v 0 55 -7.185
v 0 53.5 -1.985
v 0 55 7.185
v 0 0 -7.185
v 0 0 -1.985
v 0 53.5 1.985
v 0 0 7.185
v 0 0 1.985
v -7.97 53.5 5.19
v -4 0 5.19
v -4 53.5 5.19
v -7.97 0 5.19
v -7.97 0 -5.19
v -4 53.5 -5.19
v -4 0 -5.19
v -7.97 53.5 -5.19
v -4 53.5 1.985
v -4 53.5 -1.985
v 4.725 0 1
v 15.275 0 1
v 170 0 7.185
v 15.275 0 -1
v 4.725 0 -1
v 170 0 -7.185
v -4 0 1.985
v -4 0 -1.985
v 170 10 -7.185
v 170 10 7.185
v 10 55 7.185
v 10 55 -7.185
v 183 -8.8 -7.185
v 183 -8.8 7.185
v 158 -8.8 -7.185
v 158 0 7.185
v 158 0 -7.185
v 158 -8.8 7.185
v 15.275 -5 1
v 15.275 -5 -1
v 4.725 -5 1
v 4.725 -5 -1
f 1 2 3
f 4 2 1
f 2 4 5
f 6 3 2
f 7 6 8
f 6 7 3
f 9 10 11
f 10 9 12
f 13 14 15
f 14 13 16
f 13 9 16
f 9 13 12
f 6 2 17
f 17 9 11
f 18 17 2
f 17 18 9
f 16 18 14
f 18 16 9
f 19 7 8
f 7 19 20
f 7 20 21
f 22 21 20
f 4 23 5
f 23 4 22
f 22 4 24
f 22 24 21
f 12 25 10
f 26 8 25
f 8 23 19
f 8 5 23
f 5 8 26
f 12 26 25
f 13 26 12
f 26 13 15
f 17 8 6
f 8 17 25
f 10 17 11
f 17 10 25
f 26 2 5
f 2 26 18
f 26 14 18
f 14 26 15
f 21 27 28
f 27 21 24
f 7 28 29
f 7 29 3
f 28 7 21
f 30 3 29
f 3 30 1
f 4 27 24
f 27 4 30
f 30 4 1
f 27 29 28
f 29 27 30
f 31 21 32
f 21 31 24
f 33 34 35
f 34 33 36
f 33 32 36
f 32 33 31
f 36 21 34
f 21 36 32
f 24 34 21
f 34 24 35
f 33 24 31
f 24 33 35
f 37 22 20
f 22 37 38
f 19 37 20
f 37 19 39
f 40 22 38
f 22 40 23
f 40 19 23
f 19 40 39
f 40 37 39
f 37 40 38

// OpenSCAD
$fn = 80;



module body(t_len, t_height, t_shelf_len) {
    polygon(points=[
                    [0,0],
                    [0, t_height],
                    [t_shelf_len, t_height],
                    [t_len, t_shelf_len],
                    [t_len, 0]]);
};

//Primary Shape
main_t_shelf_len = 10;
main_t_len = 170;
main_t_height = 55;
main_body_dep = 14.37;

main_body_thickness = 2;

//Cutout Sides
cutout_t_shelf_len= main_t_shelf_len - main_body_thickness*2;
cutout_t_len = main_t_len - main_body_thickness*2;
cutout_t_height= main_t_height - main_body_thickness*2;
cutout_body_dep = main_body_dep;


module cutout() {
translate([main_body_thickness, main_body_thickness, main_body_thickness/2])
    linear_extrude(height=main_body_dep) 
      body(cutout_t_len, cutout_t_height, cutout_t_shelf_len);
}

bracket_h = main_t_height - 1.5;
bracket_d = 10.38;
bracket_w = 7.97;

module bracket_body() {
  difference(){
    translate([-bracket_w/2,bracket_h/2,0])
      cube([bracket_w, bracket_h, bracket_d ], center=true);
    
    translate([ -2, bracket_h/2, bracket_w/2])
    cube([4, bracket_h, 4], center=true);
    
    translate([ -2, bracket_h/2, -bracket_w/2])
    cube([4, bracket_h, 4], center=true);
  }
}

module foot() {
    foot_roof_len=12;
    foot_base_len=25;
    foot_height=8.8;
    translate([main_t_len-foot_roof_len,-foot_height,0])
    linear_extrude(height=main_body_dep, center=true)
      polygon([[0,0],
              [0,foot_height],
              [foot_roof_len,foot_height],
              [foot_base_len,0]]);
}


module tab() {
    translate([10, -5/2, 0])
    cube([10.55, 5, main_body_thickness], center=true);
}


difference() {

  linear_extrude(height=main_body_dep, center=true) 
  body(main_t_len, main_t_height, main_t_shelf_len);

  //cutout();
  //mirror([0,0,1]) cutout();
}

bracket_body();
foot();
tab();
